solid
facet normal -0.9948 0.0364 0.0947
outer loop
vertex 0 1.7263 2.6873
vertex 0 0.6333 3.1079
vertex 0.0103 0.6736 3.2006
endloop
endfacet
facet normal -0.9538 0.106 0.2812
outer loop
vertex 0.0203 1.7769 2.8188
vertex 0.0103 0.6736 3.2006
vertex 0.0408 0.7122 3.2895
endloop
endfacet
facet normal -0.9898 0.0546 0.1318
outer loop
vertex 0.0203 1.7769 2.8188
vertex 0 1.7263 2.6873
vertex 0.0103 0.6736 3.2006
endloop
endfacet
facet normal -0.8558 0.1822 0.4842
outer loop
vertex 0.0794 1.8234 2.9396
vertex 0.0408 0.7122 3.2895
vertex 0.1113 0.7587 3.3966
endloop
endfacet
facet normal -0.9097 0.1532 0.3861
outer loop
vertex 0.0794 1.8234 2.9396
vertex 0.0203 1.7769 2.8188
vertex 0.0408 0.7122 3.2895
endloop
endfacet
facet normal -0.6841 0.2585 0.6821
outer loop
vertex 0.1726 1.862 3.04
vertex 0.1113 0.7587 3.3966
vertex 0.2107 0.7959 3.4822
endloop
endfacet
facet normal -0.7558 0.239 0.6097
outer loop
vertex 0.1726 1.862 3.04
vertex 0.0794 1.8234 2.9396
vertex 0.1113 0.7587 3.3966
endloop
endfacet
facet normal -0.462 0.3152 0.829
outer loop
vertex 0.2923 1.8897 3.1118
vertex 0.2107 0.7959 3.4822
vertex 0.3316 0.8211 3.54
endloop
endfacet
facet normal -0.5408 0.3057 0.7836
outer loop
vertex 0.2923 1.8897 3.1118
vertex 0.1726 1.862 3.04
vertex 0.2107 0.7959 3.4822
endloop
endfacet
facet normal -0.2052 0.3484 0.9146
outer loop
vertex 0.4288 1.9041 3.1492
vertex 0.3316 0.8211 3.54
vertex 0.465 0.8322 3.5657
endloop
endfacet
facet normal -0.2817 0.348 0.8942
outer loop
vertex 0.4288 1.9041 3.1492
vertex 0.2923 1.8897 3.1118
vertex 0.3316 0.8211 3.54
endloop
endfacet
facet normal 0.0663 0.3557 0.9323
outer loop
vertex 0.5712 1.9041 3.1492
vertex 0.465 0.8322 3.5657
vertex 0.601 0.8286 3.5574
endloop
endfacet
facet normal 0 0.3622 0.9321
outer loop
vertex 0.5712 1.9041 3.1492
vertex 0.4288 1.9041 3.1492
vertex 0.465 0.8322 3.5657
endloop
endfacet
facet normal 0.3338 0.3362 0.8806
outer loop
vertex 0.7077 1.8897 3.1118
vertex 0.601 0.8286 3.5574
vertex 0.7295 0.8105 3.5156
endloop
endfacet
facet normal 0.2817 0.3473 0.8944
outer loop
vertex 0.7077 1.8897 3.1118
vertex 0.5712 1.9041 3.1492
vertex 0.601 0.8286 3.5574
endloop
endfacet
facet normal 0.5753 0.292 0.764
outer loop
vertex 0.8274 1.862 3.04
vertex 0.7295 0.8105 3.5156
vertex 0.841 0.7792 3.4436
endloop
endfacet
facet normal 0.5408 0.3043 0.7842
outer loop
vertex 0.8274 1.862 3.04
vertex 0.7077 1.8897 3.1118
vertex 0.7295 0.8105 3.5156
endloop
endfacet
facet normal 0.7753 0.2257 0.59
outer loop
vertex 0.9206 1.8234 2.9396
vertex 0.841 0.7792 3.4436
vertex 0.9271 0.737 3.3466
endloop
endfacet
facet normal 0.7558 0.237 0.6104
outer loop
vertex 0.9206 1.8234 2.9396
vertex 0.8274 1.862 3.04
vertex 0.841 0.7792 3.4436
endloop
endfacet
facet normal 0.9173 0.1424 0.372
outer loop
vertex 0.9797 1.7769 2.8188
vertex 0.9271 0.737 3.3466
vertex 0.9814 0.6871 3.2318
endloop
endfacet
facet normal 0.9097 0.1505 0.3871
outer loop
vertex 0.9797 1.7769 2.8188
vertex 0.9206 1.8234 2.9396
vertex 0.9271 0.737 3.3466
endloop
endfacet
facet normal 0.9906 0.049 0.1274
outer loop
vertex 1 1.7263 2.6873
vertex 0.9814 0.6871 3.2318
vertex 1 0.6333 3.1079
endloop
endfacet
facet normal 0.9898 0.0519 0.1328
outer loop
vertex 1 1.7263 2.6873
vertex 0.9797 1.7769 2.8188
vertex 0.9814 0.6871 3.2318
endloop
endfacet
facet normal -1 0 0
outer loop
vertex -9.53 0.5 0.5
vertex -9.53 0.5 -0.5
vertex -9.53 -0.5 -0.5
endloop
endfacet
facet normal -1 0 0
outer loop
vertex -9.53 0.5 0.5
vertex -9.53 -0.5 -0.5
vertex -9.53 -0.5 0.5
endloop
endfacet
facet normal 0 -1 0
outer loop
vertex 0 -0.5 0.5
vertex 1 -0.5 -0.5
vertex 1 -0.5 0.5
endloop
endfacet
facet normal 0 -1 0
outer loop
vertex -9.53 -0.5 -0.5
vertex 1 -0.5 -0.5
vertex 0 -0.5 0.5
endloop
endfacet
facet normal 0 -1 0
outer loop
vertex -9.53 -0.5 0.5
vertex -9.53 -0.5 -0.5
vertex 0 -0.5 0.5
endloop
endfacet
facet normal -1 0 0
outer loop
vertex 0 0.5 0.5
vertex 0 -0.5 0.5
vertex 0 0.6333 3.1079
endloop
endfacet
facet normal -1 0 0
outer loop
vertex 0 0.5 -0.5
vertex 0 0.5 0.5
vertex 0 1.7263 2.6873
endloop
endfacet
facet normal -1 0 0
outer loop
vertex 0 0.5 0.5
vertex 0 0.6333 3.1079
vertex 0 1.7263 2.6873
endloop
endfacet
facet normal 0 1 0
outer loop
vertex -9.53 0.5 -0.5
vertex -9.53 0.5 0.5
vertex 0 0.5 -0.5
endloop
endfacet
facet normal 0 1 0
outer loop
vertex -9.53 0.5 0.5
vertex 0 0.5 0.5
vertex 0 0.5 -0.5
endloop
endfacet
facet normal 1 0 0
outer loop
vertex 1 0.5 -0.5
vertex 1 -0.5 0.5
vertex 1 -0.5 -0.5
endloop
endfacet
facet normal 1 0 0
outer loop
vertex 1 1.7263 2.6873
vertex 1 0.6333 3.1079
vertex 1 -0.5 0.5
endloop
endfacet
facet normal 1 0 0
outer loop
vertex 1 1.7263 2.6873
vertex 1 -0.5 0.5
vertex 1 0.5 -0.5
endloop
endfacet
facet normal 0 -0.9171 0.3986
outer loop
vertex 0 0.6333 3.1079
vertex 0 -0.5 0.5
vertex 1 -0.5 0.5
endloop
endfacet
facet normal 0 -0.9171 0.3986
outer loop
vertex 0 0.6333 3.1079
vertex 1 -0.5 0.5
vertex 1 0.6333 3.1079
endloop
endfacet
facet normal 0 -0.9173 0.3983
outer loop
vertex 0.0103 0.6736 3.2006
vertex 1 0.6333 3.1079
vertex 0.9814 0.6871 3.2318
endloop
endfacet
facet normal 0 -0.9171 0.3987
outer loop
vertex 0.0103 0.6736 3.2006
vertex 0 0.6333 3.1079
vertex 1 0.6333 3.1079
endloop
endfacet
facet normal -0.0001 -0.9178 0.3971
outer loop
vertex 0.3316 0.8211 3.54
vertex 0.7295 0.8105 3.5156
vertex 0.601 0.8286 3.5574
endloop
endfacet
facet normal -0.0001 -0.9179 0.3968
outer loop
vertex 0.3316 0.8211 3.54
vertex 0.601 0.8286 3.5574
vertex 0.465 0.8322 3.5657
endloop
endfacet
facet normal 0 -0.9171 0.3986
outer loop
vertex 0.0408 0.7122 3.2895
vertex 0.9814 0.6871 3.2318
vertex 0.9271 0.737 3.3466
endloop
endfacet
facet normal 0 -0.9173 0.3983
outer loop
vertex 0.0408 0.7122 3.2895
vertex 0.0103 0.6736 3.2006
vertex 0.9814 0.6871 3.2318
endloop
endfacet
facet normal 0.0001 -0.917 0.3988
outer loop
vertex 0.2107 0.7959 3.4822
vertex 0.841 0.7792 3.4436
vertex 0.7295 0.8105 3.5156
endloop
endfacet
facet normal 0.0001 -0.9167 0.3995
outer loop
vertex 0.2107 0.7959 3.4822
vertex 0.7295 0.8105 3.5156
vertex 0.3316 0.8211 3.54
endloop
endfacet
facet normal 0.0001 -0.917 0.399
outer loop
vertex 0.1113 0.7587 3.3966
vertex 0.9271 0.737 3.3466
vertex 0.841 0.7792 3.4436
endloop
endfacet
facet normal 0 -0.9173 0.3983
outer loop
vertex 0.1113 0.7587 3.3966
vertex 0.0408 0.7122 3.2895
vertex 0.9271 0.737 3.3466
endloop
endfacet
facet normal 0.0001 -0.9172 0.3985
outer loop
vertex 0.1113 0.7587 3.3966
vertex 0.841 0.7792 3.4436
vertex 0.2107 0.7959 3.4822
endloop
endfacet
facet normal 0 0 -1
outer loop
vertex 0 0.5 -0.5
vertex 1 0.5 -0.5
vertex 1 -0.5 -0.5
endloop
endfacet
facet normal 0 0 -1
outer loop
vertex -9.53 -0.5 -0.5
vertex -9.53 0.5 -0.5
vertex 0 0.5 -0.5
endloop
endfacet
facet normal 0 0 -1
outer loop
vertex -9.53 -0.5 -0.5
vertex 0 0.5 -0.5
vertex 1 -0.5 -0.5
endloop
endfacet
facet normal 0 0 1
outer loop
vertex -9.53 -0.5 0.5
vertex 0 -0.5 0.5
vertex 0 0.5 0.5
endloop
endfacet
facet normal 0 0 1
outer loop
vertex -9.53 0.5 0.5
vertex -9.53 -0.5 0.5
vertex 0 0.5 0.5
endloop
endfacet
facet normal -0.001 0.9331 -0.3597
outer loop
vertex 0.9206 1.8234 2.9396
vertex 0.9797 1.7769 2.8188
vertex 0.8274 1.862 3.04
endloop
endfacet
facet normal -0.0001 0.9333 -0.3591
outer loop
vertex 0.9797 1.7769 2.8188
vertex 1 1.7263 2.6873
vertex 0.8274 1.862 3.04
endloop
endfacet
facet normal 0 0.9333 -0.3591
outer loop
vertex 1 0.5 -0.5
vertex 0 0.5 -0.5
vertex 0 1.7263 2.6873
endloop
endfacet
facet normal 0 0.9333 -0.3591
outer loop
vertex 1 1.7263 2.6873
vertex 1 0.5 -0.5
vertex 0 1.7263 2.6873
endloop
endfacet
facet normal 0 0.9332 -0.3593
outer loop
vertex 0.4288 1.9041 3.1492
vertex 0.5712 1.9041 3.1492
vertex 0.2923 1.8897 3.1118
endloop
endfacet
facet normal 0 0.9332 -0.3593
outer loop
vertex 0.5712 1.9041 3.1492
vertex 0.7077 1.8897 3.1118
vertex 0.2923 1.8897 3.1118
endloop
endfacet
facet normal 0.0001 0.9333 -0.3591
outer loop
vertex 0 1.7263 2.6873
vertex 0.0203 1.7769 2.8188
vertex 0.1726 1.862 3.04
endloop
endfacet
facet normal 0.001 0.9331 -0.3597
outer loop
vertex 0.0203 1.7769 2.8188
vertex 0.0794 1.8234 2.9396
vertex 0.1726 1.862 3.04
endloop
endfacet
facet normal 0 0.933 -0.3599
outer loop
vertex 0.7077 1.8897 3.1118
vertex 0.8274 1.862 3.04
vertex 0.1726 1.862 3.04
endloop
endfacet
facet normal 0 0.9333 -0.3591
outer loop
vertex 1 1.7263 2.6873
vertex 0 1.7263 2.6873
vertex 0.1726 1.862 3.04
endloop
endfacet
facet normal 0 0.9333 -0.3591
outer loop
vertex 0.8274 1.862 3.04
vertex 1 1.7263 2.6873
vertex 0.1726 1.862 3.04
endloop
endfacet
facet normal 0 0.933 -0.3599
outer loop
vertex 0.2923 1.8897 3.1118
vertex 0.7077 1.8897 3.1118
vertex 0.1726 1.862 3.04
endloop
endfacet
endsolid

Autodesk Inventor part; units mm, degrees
ref_plane "YZ Plane" through (0, 0, 0) normal (1, 0, 0) x (0, 1, 0)
ref_plane "XZ Plane" through (0, 0, 0) normal (0, 1, 0) x (-1, 0, 0)
ref_plane "XY Plane" through (0, 0, 0) normal (0, 0, 1) x (1, 0, 0)
sketch "Sketch1" plane through (0, 0, 0) normal (1, 0, 0) x (0, 1, 0)
  line L0 (0, 0) -> (2.696, 0)
  line L1 (2.696, 0) -> (2.696, 6.6)
  circle A0 centre (2.696, 6.6) radius 0.5
  line L2 (-0.5, 0.5) -> (0.5, 0.5)
  line L3 (0.5, 0.5) -> (0.5, -0.5)
  line L4 (0.5, -0.5) -> (-0.5, -0.5)
  line L5 (-0.5, -0.5) -> (-0.5, 0.5)
  line L6 (-0.5, 0.5) -> (0.5, -0.5) construction
  line L7 (0.5, 0.5) -> (-0.5, -0.5) construction
  line L8 (0.5, -0.5) -> (3.1627, 6.4205)
  line L9 (-0.5, 0.5) -> (2.2374, 6.7993)
  dimension "d0" = 2.696
  dimension "d1" = 6.6
  dimension "d2" = 1
  dimension "d3" = 1
  dimension "d4" = 1
extrude "Extrusion1" add sketch "Sketch1" along normal blind 1 contours L3 L2 L9 A0 L1 L8 L0 | L3 L4 L5 L2 | L0 L8 L3 | L1 A0 L8 | A0
sketch "Sketch2" plane through (0, 0, 0) normal (-1, 0, 0) x (0, 0, 1)
  line L0 (-0.5, -0.5) -> (0.5, -0.5)
  line L1 (0.5, -0.5) -> (0.5, 0.5)
  line L2 (0.5, 0.5) -> (-0.5, 0.5)
  line L3 (-0.5, 0.5) -> (-0.5, -0.5)
  line L4 (-0.5, -0.5) -> (0.5, 0.5) construction
  line L5 (0.5, -0.5) -> (-0.5, 0.5) construction
  arc A0 (6.7993, 2.2374) -> (6.4205, 3.1627) centre (6.6, 2.696) ccw projected
  circle A1 centre (6.6, 2.696) radius 0.5
  point P0 (0, 0)
  point P1 (6.4205, 3.1627)
  point P2 (6.7993, 2.2374)
  dimension "d7" = 1
  dimension "d8" = 1
extrude "Extrusion2" add sketch "Sketch2" along normal blind 9.53
sketch "Sketch3" plane through (0, 3.1627, 6.4205) normal (0, 0.9333, -0.3591) x (1, 0, 0)
  line L0 (0, 0) -> (1, 0) projected
  line L1 (1, 0) -> (1, 4)
  line L2 (1, 7.415) -> (1, 0) projected
  line L3 (1, 4) -> (0, 4)
  circle A0 centre (0.5, 4) radius 0.5
  line L4 (1, 4) -> (1.9656, 2.6006)
  line L5 (1.9656, 2.6006) -> (1.9656, -0.469)
  line L6 (1.9656, -0.469) -> (1.3988, -1.3966)
  line L7 (1.3988, -1.3966) -> (-6.1023, -1.6689)
  line L8 (-6.1023, -1.6689) -> (-10.3351, -1.4334)
  line L9 (-10.3351, -1.4334) -> (-10.659, 1.386)
  line L10 (-10.659, 1.386) -> (-5.3662, 3.1822)
  line L11 (-5.3662, 3.1822) -> (0, 4)
  point P0 (0, 7.1279)
  point P1 (1, 4)
  dimension "d11" = 4
extrude "Extrusion3" cut sketch "Sketch3" against normal blind 10 contours L4 L5 L6 L7 L8 L9 L10 L11 A0
properties part number "Radius_Bone1_Joint_LOWER"
